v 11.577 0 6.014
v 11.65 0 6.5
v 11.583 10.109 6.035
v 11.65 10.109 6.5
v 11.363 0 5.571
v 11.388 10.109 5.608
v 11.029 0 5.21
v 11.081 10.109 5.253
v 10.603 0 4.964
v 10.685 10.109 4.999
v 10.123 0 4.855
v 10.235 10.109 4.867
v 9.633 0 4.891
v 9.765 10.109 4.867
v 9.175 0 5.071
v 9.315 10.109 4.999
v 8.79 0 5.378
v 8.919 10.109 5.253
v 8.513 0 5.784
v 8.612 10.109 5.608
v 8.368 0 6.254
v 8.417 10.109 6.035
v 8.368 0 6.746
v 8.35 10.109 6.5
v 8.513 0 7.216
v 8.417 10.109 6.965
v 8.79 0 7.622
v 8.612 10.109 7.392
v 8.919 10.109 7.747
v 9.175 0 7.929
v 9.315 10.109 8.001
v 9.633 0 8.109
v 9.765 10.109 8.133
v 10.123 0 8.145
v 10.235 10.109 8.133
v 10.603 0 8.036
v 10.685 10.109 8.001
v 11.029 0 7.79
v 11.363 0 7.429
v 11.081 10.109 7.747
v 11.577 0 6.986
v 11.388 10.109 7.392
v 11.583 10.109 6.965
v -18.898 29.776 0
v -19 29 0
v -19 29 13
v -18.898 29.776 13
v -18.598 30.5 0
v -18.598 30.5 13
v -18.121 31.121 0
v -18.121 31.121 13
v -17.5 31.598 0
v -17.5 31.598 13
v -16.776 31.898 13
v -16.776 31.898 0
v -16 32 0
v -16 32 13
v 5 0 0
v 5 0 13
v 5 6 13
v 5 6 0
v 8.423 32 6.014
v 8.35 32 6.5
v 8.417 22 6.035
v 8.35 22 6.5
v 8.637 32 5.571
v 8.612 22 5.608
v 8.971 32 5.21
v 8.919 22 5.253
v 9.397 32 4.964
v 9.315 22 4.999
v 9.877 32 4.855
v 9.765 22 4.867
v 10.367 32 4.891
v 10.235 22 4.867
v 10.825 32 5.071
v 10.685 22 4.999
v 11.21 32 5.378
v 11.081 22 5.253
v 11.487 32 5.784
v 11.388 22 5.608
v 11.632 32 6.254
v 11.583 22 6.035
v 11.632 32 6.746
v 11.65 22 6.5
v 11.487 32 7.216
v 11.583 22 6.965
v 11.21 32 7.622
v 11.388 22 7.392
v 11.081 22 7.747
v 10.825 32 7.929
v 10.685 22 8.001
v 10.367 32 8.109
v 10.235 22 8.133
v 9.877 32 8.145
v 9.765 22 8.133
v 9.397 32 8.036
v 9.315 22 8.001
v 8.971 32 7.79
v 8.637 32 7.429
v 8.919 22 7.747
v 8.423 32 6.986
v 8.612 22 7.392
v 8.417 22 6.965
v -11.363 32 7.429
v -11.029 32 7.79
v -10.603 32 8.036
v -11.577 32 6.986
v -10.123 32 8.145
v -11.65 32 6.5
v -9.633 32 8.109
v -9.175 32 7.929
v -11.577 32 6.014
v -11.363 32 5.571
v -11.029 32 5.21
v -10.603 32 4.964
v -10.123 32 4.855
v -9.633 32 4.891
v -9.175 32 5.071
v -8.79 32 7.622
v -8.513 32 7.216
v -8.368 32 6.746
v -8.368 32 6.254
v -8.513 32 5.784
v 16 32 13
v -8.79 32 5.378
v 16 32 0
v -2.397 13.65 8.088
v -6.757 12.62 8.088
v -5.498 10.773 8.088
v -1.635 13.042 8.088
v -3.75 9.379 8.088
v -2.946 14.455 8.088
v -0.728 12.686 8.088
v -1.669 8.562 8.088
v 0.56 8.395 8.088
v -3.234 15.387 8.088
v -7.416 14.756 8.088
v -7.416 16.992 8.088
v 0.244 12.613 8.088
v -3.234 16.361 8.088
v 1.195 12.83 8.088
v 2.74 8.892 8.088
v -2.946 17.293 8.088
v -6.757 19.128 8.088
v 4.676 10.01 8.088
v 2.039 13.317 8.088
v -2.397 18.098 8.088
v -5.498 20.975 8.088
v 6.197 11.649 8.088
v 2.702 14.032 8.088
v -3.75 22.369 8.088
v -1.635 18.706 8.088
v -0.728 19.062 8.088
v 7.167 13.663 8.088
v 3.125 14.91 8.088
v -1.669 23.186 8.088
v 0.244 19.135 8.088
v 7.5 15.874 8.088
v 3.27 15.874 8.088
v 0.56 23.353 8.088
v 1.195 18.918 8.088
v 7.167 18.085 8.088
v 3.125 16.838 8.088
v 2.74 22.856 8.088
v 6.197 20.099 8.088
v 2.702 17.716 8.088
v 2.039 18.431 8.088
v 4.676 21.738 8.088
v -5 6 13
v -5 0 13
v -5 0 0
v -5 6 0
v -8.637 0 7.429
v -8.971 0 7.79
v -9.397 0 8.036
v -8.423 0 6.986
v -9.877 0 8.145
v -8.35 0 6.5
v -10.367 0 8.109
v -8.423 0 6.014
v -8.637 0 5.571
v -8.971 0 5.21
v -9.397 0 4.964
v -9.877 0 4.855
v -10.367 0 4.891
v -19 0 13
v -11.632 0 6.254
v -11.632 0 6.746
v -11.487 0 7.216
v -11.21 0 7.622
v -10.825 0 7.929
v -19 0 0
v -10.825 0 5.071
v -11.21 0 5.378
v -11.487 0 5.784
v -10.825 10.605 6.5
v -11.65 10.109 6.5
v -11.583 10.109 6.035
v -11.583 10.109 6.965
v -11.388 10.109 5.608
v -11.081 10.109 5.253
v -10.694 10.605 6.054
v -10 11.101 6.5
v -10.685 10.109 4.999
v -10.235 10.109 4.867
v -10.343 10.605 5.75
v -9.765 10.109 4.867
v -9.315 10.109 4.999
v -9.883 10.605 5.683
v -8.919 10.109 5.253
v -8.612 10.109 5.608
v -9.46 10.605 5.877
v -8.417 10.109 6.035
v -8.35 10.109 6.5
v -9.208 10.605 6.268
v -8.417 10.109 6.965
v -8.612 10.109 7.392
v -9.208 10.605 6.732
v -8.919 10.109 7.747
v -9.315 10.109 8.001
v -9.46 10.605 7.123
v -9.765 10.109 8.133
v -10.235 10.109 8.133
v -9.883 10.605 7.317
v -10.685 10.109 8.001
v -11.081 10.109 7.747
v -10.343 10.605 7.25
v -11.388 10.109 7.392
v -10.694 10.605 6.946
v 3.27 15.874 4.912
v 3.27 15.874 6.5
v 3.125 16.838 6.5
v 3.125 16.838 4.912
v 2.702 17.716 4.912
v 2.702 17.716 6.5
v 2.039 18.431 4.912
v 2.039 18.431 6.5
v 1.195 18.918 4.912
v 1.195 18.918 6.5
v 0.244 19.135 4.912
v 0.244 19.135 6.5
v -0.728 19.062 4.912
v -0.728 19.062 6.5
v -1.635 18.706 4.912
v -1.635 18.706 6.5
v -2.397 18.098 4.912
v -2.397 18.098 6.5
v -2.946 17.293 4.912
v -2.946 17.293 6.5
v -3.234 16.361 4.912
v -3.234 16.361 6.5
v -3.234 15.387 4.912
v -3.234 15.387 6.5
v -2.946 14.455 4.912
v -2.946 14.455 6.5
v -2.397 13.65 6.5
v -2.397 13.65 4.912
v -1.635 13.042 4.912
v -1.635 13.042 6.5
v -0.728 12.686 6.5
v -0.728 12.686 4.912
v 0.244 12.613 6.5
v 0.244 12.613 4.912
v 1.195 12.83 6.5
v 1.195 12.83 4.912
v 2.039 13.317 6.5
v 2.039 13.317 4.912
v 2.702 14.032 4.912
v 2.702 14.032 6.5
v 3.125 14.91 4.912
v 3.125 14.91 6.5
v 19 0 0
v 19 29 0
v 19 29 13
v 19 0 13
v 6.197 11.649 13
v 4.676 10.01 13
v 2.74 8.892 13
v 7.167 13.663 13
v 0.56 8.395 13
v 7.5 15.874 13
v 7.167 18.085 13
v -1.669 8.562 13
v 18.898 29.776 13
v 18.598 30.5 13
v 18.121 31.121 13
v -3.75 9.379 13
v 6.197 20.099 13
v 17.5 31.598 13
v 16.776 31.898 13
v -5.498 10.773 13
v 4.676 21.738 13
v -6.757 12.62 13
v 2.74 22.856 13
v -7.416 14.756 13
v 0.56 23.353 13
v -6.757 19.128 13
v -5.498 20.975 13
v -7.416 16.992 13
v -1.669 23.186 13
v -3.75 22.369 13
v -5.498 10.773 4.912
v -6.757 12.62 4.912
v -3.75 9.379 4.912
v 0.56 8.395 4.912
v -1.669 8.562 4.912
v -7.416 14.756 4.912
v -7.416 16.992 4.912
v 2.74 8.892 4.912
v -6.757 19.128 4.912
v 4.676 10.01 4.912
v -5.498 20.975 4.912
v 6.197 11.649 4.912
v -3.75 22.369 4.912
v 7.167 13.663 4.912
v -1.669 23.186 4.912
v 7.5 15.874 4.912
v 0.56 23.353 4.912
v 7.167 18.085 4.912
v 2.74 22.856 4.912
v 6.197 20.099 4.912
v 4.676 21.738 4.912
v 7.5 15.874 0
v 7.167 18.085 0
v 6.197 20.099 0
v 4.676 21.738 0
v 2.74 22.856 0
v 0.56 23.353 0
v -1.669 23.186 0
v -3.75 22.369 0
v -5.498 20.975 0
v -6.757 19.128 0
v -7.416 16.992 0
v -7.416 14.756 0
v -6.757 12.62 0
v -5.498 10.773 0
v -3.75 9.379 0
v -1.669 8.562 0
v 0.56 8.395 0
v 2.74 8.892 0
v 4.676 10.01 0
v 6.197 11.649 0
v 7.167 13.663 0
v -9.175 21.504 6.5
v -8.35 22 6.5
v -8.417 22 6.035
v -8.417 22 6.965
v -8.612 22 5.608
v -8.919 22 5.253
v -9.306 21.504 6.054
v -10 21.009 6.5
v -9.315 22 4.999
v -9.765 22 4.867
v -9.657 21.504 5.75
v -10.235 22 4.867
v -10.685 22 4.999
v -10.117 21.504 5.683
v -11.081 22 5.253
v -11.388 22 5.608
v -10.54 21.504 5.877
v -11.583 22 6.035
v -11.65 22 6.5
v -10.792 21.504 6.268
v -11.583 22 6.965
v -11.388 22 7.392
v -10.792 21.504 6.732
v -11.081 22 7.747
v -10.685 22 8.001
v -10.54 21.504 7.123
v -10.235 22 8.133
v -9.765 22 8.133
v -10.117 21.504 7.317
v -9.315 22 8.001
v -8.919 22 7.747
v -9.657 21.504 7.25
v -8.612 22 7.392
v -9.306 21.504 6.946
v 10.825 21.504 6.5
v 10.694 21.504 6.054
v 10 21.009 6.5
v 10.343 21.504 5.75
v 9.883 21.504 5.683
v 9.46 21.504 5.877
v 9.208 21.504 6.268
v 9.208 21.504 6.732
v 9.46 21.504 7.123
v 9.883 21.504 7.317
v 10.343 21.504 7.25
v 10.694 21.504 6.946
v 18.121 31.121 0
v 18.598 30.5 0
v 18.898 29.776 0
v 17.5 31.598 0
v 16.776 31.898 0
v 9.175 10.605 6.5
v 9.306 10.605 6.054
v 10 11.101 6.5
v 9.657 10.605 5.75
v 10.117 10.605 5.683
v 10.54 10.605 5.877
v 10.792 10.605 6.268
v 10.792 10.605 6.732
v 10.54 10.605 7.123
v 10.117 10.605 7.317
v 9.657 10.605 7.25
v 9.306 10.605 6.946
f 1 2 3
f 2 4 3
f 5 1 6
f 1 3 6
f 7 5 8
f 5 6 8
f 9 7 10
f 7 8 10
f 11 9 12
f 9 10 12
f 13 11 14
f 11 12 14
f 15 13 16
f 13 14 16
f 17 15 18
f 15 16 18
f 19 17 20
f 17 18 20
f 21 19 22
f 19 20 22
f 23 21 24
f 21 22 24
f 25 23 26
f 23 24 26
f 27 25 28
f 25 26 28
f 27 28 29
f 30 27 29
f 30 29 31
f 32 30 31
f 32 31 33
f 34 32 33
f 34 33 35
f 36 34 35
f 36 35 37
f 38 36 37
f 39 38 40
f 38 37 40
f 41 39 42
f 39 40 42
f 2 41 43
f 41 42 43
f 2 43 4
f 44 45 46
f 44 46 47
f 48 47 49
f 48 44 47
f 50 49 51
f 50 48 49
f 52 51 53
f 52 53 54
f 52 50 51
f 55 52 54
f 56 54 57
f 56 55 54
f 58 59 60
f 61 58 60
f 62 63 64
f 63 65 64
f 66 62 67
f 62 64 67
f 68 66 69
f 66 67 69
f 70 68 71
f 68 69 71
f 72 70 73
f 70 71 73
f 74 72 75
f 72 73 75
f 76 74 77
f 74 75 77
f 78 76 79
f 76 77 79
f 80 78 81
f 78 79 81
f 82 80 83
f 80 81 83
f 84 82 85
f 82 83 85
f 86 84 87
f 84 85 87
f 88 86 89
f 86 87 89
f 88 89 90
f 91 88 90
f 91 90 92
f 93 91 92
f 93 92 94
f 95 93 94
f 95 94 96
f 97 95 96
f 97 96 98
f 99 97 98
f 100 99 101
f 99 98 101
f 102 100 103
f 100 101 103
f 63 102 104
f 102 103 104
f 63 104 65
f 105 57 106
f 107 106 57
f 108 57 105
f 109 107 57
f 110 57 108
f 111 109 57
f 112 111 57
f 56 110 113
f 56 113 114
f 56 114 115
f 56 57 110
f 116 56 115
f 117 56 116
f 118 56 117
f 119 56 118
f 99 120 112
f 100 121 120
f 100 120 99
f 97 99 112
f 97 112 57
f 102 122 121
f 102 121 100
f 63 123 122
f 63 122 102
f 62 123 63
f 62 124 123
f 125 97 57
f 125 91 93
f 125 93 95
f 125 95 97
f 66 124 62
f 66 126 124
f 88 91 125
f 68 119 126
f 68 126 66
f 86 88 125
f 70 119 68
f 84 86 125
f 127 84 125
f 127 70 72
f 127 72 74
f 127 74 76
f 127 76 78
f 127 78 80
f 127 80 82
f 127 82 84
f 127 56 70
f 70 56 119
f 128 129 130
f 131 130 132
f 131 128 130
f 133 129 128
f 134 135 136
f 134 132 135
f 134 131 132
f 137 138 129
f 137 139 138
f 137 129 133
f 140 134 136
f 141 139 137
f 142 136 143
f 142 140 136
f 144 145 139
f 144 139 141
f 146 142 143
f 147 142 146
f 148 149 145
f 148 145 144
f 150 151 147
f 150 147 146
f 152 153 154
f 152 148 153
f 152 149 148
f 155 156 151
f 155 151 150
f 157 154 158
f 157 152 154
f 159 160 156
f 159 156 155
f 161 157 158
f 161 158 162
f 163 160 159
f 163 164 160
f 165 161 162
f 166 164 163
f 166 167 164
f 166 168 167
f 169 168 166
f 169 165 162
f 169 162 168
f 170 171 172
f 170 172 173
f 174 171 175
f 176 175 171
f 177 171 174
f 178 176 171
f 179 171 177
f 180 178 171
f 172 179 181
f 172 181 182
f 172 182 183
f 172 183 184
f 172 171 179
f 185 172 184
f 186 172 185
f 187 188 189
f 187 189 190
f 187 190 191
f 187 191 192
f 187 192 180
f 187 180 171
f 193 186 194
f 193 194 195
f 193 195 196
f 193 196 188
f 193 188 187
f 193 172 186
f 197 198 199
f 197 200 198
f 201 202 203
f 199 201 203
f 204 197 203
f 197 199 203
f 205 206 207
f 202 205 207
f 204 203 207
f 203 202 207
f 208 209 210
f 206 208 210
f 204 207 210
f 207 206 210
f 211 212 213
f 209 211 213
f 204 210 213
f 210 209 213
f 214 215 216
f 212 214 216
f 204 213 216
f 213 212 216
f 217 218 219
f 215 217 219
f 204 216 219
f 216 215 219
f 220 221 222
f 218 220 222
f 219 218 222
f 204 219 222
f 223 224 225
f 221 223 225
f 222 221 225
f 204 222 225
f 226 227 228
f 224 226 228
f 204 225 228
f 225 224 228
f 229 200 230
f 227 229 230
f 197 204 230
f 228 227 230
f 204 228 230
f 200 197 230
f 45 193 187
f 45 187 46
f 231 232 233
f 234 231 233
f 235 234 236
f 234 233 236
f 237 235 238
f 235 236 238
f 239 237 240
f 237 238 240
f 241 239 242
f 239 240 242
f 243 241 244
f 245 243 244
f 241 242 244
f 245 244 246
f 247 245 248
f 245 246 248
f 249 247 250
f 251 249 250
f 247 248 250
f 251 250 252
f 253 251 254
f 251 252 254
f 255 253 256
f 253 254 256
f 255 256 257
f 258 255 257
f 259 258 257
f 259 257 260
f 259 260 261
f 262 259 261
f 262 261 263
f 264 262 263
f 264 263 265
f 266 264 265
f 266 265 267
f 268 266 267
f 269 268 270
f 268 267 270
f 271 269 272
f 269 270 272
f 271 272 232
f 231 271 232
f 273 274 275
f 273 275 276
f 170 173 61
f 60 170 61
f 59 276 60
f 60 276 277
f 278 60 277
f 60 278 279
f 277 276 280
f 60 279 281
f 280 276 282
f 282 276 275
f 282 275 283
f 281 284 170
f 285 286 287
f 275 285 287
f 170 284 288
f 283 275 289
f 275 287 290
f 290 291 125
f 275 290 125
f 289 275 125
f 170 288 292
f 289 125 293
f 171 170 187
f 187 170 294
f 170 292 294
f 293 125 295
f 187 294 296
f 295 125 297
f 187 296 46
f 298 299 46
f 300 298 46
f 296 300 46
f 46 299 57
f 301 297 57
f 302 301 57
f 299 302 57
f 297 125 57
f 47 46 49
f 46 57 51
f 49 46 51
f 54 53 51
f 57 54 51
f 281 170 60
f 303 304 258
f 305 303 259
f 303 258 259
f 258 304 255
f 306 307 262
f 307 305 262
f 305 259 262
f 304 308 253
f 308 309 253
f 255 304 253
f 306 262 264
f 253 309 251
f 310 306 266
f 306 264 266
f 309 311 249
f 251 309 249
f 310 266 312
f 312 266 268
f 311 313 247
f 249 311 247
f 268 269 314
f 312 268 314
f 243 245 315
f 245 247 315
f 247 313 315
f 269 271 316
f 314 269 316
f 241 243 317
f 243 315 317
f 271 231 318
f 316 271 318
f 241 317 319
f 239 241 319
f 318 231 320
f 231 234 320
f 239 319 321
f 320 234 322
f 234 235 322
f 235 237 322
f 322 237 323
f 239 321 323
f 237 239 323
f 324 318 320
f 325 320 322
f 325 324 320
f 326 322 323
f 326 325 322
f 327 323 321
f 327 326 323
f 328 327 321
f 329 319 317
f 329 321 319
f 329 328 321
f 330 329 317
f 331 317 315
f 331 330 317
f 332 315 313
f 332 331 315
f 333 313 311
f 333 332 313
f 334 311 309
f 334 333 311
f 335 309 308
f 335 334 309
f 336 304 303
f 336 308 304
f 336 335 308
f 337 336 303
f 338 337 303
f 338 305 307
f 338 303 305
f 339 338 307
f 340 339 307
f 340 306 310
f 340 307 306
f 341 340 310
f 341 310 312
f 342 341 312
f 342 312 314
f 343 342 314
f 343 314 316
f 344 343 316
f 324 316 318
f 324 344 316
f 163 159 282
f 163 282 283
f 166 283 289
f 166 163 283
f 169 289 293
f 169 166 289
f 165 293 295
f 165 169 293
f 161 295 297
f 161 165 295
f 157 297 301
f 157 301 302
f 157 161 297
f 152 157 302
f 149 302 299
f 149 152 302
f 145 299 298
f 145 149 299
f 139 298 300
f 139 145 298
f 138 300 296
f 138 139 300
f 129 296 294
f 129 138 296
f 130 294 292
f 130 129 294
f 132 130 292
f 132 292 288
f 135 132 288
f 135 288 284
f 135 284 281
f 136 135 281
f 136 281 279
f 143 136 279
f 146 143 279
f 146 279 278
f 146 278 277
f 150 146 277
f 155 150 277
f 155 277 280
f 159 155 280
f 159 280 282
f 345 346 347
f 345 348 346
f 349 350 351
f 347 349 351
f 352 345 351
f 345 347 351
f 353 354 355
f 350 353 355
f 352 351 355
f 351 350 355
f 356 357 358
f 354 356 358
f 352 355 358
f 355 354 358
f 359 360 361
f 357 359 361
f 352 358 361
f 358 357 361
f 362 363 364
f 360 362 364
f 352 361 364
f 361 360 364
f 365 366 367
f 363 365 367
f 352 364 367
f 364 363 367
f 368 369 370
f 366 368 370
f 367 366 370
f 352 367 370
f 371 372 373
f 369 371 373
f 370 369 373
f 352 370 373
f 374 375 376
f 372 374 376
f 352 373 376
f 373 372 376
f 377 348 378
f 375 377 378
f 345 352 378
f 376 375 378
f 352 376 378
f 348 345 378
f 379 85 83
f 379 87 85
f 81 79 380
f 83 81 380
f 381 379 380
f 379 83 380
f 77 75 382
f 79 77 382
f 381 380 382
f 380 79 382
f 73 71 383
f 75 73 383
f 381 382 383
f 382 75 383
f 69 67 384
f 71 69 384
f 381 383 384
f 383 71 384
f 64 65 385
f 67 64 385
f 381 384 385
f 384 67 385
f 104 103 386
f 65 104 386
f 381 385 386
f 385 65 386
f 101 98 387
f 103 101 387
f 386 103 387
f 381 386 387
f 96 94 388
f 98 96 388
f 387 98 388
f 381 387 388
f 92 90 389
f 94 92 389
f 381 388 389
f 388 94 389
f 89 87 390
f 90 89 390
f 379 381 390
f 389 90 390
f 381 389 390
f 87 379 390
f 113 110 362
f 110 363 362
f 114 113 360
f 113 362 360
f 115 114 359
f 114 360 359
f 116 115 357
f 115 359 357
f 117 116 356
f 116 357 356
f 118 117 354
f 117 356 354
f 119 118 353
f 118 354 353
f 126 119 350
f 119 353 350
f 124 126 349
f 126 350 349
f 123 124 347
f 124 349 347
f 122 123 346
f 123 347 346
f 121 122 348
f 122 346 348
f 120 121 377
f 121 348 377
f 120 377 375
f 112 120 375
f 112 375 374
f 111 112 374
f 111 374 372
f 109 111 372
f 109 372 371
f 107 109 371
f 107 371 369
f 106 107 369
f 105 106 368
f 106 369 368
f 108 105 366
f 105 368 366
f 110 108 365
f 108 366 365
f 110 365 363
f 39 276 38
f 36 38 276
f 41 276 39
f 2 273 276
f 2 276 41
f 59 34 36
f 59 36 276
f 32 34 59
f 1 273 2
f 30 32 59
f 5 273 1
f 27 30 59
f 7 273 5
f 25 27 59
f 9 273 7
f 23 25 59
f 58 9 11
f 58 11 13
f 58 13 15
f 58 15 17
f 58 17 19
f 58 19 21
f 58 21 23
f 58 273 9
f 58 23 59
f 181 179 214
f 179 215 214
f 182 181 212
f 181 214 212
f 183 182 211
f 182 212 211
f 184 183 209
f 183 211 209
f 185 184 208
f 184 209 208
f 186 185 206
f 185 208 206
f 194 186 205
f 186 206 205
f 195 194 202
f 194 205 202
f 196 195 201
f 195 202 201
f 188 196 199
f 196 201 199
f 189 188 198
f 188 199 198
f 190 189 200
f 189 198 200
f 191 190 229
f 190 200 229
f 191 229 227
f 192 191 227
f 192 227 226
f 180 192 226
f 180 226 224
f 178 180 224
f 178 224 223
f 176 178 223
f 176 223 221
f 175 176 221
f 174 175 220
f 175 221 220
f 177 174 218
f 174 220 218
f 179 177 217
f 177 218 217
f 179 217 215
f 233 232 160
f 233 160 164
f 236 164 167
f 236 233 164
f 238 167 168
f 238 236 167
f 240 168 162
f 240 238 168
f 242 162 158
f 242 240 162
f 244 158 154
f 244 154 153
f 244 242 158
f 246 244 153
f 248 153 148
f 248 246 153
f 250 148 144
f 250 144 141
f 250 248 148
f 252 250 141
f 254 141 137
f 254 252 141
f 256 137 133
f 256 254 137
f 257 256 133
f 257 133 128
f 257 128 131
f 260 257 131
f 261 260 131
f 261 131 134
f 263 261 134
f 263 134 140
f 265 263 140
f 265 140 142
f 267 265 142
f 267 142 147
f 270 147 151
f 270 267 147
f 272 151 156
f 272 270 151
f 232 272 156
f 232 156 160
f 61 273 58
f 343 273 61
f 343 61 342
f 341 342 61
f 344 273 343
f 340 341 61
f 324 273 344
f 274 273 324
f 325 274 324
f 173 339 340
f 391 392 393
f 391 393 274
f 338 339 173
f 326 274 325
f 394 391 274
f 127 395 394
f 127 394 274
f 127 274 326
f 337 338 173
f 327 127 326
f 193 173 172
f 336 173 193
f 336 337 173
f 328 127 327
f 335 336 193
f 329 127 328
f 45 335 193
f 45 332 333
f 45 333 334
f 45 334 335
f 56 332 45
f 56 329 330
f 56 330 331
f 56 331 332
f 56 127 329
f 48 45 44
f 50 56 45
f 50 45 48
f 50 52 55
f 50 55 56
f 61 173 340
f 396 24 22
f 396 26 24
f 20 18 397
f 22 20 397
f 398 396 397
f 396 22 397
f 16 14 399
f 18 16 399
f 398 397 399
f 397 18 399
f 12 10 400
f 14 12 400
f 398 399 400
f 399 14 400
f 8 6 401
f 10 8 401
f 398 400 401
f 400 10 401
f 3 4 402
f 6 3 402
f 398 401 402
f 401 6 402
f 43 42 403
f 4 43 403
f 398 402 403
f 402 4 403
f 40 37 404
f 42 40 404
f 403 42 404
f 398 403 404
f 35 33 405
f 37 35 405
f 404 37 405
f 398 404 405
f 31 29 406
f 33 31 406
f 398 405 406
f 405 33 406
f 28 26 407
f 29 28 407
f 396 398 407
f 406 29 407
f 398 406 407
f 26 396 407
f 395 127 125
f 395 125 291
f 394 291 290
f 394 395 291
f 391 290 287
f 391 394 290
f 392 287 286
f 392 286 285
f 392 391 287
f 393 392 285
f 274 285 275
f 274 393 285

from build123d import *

# Parameters (mm, degrees)
SKETCH1_R                 = 7.5
BOSS_EXTRUDE1_DEPTH       = 13
SKETCH3_R                 = 8.7376
SKETCH3_R_2               = 3.27025
BOSS_EXTRUDE2_DEPTH       = 1.5875
BOSS_EXTRUDE2_DEPTH_BACK  = 1.5875
M4X0_7_TAPPED_HOLE1_D     = 3.3
M4X0_7_TAPPED_HOLE1_DEPTH = 10.1092
M4X0_7_TAPPED_HOLE1_TIP   = 0.991420021
M4X0_7_TAPPED_HOLE2_D     = 3.3
M4X0_7_TAPPED_HOLE2_DEPTH = 10
M4X0_7_TAPPED_HOLE2_TIP   = 0.991420021
SKETCH11_W                = 10
SKETCH11_H                = 6
CUT_EXTRUDE1_DEPTH        = 15


with BuildPart() as part:
    # Sketch1 → Boss-Extrude1 (new body)
    with BuildSketch(Plane.XY):
        with BuildLine():
            Line((-16, 32), (16, 32))
            ThreePointArc((16, 32), (18.121320344, 31.121320344), (19, 29))
            Line((19, 29), (19, 0))
            Line((19, 0), (0, 0))
            Line((0, 0), (-19, 0))
            Line((-19, 0), (-19, 29))
            ThreePointArc((-19, 29), (-18.121320344, 31.121320344), (-16, 32))
        make_face()
        with Locations((0, 15.874)):
            Circle(SKETCH1_R, mode=Mode.SUBTRACT)
    extrude(amount=BOSS_EXTRUDE1_DEPTH)

    # Sketch3 → Boss-Extrude2 (add, two sides)
    with BuildSketch(Plane.XY.offset(6.5)) as boss_extrude2_sk:
        with Locations((0, 15.874)):
            Circle(SKETCH3_R)
        with Locations((0, 15.874)):
            Circle(SKETCH3_R_2, mode=Mode.SUBTRACT)
    extrude(amount=BOSS_EXTRUDE2_DEPTH)
    extrude(boss_extrude2_sk.sketch, amount=-BOSS_EXTRUDE2_DEPTH_BACK)

    # M4x0.7 Tapped Hole1
    with Locations(Plane(origin=(0, 0, 0), x_dir=(-1, 0, 0), z_dir=(0, -1, 0))):
        with Locations((10, -6.5), (-10, -6.5)):
            Hole(M4X0_7_TAPPED_HOLE1_D / 2, depth=M4X0_7_TAPPED_HOLE1_DEPTH)
            with Locations((0, 0, -(M4X0_7_TAPPED_HOLE1_DEPTH + M4X0_7_TAPPED_HOLE1_TIP / 2))):  # 118° drill point
                Cone(0, M4X0_7_TAPPED_HOLE1_D / 2, M4X0_7_TAPPED_HOLE1_TIP, mode=Mode.SUBTRACT)

    # M4x0.7 Tapped Hole2
    with Locations(Plane(origin=(0, 32, 0), x_dir=(1, 0, 0), z_dir=(0, 1, 0))):
        with Locations((-10, -6.5), (10, -6.5)):
            Hole(M4X0_7_TAPPED_HOLE2_D / 2, depth=M4X0_7_TAPPED_HOLE2_DEPTH)
            with Locations((0, 0, -(M4X0_7_TAPPED_HOLE2_DEPTH + M4X0_7_TAPPED_HOLE2_TIP / 2))):  # 118° drill point
                Cone(0, M4X0_7_TAPPED_HOLE2_D / 2, M4X0_7_TAPPED_HOLE2_TIP, mode=Mode.SUBTRACT)

    # Sketch11 → Cut-Extrude1 (cut)
    with BuildSketch(Plane.XY.offset(13)):
        with Locations((0, 3)):
            Rectangle(SKETCH11_W, SKETCH11_H)
    extrude(amount=-CUT_EXTRUDE1_DEPTH, mode=Mode.SUBTRACT)


solid = part.part
